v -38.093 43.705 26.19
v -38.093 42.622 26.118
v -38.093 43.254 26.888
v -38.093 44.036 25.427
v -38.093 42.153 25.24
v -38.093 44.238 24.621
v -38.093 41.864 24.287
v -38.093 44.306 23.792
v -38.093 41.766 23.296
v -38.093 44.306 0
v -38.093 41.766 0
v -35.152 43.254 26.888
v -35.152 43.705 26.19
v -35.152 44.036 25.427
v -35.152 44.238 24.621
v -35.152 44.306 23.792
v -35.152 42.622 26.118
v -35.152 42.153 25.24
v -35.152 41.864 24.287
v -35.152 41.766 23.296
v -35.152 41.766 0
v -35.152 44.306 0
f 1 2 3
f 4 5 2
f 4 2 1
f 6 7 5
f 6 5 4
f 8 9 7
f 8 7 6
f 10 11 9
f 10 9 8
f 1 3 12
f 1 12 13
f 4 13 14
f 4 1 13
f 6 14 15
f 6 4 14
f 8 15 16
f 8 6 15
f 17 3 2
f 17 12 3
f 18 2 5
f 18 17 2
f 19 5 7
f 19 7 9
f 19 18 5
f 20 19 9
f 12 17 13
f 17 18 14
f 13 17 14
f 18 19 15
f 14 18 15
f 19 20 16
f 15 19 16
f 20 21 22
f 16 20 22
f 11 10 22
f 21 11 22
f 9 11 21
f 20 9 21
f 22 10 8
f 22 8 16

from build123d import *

# Parameters (mm, degrees)
F0_W        = 2.9410525192
F0_H        = 2.54
F1_DEPTH    = 38.1
F2_T1_DEPTH = 68.2618004135
F3_R        = 5.08
F4_T1_DEPTH = 23.6793240582


# Not quite as in the source:
# - a fillet or chamfer that OpenCascade refuses, or shapes differently, is made with other operations: its cross-section is extruded or revolved along the edge and cut away or added


with BuildPart() as f1:
    # F0 (on Top) → F1 (new body)
    with BuildSketch(Plane.XY):
        with Locations((-36.622652784, 43.036242947)):
            Rectangle(F0_W, F0_H)
    extrude(amount=F1_DEPTH)

    # F2: chamfer of 12.7 on 1 edges, made by hand

    # F2_s2 → F2_t1 (cut)
    with BuildSketch(Plane.YZ.offset(-70.7535529908)):
        Polygon((41.766242947, 25.4), (54.466242947, 38.1), (41.766242947, 38.1), align=None)
    extrude(amount=F2_T1_DEPTH, mode=Mode.SUBTRACT)

    # F3
    f3_edges = [f1.edges().sort_by_distance(p)[0] for p in [
        (-36.622653, 41.766243, 25.4),
    ]]
    fillet(f3_edges, radius=F3_R)

    # F4: fillet of radius 5.08 on 1 edges, made by hand

    # F4_s2 → F4_t1 (cut)
    with BuildSketch(Plane.YZ.offset(-48.4623148131)):
        with BuildLine():
            ThreePointArc((43.2541404986, 26.8878975516), (44.0360308613, 25.4270750946), (44.306242947, 23.7923456922))
            Line((44.306242947, 23.7923456922), (44.306242947, 27.94))
            Line((44.306242947, 27.94), (43.2541404986, 26.8878975516))
        make_face()
    extrude(amount=F4_T1_DEPTH, mode=Mode.SUBTRACT)


solid = f1.part
